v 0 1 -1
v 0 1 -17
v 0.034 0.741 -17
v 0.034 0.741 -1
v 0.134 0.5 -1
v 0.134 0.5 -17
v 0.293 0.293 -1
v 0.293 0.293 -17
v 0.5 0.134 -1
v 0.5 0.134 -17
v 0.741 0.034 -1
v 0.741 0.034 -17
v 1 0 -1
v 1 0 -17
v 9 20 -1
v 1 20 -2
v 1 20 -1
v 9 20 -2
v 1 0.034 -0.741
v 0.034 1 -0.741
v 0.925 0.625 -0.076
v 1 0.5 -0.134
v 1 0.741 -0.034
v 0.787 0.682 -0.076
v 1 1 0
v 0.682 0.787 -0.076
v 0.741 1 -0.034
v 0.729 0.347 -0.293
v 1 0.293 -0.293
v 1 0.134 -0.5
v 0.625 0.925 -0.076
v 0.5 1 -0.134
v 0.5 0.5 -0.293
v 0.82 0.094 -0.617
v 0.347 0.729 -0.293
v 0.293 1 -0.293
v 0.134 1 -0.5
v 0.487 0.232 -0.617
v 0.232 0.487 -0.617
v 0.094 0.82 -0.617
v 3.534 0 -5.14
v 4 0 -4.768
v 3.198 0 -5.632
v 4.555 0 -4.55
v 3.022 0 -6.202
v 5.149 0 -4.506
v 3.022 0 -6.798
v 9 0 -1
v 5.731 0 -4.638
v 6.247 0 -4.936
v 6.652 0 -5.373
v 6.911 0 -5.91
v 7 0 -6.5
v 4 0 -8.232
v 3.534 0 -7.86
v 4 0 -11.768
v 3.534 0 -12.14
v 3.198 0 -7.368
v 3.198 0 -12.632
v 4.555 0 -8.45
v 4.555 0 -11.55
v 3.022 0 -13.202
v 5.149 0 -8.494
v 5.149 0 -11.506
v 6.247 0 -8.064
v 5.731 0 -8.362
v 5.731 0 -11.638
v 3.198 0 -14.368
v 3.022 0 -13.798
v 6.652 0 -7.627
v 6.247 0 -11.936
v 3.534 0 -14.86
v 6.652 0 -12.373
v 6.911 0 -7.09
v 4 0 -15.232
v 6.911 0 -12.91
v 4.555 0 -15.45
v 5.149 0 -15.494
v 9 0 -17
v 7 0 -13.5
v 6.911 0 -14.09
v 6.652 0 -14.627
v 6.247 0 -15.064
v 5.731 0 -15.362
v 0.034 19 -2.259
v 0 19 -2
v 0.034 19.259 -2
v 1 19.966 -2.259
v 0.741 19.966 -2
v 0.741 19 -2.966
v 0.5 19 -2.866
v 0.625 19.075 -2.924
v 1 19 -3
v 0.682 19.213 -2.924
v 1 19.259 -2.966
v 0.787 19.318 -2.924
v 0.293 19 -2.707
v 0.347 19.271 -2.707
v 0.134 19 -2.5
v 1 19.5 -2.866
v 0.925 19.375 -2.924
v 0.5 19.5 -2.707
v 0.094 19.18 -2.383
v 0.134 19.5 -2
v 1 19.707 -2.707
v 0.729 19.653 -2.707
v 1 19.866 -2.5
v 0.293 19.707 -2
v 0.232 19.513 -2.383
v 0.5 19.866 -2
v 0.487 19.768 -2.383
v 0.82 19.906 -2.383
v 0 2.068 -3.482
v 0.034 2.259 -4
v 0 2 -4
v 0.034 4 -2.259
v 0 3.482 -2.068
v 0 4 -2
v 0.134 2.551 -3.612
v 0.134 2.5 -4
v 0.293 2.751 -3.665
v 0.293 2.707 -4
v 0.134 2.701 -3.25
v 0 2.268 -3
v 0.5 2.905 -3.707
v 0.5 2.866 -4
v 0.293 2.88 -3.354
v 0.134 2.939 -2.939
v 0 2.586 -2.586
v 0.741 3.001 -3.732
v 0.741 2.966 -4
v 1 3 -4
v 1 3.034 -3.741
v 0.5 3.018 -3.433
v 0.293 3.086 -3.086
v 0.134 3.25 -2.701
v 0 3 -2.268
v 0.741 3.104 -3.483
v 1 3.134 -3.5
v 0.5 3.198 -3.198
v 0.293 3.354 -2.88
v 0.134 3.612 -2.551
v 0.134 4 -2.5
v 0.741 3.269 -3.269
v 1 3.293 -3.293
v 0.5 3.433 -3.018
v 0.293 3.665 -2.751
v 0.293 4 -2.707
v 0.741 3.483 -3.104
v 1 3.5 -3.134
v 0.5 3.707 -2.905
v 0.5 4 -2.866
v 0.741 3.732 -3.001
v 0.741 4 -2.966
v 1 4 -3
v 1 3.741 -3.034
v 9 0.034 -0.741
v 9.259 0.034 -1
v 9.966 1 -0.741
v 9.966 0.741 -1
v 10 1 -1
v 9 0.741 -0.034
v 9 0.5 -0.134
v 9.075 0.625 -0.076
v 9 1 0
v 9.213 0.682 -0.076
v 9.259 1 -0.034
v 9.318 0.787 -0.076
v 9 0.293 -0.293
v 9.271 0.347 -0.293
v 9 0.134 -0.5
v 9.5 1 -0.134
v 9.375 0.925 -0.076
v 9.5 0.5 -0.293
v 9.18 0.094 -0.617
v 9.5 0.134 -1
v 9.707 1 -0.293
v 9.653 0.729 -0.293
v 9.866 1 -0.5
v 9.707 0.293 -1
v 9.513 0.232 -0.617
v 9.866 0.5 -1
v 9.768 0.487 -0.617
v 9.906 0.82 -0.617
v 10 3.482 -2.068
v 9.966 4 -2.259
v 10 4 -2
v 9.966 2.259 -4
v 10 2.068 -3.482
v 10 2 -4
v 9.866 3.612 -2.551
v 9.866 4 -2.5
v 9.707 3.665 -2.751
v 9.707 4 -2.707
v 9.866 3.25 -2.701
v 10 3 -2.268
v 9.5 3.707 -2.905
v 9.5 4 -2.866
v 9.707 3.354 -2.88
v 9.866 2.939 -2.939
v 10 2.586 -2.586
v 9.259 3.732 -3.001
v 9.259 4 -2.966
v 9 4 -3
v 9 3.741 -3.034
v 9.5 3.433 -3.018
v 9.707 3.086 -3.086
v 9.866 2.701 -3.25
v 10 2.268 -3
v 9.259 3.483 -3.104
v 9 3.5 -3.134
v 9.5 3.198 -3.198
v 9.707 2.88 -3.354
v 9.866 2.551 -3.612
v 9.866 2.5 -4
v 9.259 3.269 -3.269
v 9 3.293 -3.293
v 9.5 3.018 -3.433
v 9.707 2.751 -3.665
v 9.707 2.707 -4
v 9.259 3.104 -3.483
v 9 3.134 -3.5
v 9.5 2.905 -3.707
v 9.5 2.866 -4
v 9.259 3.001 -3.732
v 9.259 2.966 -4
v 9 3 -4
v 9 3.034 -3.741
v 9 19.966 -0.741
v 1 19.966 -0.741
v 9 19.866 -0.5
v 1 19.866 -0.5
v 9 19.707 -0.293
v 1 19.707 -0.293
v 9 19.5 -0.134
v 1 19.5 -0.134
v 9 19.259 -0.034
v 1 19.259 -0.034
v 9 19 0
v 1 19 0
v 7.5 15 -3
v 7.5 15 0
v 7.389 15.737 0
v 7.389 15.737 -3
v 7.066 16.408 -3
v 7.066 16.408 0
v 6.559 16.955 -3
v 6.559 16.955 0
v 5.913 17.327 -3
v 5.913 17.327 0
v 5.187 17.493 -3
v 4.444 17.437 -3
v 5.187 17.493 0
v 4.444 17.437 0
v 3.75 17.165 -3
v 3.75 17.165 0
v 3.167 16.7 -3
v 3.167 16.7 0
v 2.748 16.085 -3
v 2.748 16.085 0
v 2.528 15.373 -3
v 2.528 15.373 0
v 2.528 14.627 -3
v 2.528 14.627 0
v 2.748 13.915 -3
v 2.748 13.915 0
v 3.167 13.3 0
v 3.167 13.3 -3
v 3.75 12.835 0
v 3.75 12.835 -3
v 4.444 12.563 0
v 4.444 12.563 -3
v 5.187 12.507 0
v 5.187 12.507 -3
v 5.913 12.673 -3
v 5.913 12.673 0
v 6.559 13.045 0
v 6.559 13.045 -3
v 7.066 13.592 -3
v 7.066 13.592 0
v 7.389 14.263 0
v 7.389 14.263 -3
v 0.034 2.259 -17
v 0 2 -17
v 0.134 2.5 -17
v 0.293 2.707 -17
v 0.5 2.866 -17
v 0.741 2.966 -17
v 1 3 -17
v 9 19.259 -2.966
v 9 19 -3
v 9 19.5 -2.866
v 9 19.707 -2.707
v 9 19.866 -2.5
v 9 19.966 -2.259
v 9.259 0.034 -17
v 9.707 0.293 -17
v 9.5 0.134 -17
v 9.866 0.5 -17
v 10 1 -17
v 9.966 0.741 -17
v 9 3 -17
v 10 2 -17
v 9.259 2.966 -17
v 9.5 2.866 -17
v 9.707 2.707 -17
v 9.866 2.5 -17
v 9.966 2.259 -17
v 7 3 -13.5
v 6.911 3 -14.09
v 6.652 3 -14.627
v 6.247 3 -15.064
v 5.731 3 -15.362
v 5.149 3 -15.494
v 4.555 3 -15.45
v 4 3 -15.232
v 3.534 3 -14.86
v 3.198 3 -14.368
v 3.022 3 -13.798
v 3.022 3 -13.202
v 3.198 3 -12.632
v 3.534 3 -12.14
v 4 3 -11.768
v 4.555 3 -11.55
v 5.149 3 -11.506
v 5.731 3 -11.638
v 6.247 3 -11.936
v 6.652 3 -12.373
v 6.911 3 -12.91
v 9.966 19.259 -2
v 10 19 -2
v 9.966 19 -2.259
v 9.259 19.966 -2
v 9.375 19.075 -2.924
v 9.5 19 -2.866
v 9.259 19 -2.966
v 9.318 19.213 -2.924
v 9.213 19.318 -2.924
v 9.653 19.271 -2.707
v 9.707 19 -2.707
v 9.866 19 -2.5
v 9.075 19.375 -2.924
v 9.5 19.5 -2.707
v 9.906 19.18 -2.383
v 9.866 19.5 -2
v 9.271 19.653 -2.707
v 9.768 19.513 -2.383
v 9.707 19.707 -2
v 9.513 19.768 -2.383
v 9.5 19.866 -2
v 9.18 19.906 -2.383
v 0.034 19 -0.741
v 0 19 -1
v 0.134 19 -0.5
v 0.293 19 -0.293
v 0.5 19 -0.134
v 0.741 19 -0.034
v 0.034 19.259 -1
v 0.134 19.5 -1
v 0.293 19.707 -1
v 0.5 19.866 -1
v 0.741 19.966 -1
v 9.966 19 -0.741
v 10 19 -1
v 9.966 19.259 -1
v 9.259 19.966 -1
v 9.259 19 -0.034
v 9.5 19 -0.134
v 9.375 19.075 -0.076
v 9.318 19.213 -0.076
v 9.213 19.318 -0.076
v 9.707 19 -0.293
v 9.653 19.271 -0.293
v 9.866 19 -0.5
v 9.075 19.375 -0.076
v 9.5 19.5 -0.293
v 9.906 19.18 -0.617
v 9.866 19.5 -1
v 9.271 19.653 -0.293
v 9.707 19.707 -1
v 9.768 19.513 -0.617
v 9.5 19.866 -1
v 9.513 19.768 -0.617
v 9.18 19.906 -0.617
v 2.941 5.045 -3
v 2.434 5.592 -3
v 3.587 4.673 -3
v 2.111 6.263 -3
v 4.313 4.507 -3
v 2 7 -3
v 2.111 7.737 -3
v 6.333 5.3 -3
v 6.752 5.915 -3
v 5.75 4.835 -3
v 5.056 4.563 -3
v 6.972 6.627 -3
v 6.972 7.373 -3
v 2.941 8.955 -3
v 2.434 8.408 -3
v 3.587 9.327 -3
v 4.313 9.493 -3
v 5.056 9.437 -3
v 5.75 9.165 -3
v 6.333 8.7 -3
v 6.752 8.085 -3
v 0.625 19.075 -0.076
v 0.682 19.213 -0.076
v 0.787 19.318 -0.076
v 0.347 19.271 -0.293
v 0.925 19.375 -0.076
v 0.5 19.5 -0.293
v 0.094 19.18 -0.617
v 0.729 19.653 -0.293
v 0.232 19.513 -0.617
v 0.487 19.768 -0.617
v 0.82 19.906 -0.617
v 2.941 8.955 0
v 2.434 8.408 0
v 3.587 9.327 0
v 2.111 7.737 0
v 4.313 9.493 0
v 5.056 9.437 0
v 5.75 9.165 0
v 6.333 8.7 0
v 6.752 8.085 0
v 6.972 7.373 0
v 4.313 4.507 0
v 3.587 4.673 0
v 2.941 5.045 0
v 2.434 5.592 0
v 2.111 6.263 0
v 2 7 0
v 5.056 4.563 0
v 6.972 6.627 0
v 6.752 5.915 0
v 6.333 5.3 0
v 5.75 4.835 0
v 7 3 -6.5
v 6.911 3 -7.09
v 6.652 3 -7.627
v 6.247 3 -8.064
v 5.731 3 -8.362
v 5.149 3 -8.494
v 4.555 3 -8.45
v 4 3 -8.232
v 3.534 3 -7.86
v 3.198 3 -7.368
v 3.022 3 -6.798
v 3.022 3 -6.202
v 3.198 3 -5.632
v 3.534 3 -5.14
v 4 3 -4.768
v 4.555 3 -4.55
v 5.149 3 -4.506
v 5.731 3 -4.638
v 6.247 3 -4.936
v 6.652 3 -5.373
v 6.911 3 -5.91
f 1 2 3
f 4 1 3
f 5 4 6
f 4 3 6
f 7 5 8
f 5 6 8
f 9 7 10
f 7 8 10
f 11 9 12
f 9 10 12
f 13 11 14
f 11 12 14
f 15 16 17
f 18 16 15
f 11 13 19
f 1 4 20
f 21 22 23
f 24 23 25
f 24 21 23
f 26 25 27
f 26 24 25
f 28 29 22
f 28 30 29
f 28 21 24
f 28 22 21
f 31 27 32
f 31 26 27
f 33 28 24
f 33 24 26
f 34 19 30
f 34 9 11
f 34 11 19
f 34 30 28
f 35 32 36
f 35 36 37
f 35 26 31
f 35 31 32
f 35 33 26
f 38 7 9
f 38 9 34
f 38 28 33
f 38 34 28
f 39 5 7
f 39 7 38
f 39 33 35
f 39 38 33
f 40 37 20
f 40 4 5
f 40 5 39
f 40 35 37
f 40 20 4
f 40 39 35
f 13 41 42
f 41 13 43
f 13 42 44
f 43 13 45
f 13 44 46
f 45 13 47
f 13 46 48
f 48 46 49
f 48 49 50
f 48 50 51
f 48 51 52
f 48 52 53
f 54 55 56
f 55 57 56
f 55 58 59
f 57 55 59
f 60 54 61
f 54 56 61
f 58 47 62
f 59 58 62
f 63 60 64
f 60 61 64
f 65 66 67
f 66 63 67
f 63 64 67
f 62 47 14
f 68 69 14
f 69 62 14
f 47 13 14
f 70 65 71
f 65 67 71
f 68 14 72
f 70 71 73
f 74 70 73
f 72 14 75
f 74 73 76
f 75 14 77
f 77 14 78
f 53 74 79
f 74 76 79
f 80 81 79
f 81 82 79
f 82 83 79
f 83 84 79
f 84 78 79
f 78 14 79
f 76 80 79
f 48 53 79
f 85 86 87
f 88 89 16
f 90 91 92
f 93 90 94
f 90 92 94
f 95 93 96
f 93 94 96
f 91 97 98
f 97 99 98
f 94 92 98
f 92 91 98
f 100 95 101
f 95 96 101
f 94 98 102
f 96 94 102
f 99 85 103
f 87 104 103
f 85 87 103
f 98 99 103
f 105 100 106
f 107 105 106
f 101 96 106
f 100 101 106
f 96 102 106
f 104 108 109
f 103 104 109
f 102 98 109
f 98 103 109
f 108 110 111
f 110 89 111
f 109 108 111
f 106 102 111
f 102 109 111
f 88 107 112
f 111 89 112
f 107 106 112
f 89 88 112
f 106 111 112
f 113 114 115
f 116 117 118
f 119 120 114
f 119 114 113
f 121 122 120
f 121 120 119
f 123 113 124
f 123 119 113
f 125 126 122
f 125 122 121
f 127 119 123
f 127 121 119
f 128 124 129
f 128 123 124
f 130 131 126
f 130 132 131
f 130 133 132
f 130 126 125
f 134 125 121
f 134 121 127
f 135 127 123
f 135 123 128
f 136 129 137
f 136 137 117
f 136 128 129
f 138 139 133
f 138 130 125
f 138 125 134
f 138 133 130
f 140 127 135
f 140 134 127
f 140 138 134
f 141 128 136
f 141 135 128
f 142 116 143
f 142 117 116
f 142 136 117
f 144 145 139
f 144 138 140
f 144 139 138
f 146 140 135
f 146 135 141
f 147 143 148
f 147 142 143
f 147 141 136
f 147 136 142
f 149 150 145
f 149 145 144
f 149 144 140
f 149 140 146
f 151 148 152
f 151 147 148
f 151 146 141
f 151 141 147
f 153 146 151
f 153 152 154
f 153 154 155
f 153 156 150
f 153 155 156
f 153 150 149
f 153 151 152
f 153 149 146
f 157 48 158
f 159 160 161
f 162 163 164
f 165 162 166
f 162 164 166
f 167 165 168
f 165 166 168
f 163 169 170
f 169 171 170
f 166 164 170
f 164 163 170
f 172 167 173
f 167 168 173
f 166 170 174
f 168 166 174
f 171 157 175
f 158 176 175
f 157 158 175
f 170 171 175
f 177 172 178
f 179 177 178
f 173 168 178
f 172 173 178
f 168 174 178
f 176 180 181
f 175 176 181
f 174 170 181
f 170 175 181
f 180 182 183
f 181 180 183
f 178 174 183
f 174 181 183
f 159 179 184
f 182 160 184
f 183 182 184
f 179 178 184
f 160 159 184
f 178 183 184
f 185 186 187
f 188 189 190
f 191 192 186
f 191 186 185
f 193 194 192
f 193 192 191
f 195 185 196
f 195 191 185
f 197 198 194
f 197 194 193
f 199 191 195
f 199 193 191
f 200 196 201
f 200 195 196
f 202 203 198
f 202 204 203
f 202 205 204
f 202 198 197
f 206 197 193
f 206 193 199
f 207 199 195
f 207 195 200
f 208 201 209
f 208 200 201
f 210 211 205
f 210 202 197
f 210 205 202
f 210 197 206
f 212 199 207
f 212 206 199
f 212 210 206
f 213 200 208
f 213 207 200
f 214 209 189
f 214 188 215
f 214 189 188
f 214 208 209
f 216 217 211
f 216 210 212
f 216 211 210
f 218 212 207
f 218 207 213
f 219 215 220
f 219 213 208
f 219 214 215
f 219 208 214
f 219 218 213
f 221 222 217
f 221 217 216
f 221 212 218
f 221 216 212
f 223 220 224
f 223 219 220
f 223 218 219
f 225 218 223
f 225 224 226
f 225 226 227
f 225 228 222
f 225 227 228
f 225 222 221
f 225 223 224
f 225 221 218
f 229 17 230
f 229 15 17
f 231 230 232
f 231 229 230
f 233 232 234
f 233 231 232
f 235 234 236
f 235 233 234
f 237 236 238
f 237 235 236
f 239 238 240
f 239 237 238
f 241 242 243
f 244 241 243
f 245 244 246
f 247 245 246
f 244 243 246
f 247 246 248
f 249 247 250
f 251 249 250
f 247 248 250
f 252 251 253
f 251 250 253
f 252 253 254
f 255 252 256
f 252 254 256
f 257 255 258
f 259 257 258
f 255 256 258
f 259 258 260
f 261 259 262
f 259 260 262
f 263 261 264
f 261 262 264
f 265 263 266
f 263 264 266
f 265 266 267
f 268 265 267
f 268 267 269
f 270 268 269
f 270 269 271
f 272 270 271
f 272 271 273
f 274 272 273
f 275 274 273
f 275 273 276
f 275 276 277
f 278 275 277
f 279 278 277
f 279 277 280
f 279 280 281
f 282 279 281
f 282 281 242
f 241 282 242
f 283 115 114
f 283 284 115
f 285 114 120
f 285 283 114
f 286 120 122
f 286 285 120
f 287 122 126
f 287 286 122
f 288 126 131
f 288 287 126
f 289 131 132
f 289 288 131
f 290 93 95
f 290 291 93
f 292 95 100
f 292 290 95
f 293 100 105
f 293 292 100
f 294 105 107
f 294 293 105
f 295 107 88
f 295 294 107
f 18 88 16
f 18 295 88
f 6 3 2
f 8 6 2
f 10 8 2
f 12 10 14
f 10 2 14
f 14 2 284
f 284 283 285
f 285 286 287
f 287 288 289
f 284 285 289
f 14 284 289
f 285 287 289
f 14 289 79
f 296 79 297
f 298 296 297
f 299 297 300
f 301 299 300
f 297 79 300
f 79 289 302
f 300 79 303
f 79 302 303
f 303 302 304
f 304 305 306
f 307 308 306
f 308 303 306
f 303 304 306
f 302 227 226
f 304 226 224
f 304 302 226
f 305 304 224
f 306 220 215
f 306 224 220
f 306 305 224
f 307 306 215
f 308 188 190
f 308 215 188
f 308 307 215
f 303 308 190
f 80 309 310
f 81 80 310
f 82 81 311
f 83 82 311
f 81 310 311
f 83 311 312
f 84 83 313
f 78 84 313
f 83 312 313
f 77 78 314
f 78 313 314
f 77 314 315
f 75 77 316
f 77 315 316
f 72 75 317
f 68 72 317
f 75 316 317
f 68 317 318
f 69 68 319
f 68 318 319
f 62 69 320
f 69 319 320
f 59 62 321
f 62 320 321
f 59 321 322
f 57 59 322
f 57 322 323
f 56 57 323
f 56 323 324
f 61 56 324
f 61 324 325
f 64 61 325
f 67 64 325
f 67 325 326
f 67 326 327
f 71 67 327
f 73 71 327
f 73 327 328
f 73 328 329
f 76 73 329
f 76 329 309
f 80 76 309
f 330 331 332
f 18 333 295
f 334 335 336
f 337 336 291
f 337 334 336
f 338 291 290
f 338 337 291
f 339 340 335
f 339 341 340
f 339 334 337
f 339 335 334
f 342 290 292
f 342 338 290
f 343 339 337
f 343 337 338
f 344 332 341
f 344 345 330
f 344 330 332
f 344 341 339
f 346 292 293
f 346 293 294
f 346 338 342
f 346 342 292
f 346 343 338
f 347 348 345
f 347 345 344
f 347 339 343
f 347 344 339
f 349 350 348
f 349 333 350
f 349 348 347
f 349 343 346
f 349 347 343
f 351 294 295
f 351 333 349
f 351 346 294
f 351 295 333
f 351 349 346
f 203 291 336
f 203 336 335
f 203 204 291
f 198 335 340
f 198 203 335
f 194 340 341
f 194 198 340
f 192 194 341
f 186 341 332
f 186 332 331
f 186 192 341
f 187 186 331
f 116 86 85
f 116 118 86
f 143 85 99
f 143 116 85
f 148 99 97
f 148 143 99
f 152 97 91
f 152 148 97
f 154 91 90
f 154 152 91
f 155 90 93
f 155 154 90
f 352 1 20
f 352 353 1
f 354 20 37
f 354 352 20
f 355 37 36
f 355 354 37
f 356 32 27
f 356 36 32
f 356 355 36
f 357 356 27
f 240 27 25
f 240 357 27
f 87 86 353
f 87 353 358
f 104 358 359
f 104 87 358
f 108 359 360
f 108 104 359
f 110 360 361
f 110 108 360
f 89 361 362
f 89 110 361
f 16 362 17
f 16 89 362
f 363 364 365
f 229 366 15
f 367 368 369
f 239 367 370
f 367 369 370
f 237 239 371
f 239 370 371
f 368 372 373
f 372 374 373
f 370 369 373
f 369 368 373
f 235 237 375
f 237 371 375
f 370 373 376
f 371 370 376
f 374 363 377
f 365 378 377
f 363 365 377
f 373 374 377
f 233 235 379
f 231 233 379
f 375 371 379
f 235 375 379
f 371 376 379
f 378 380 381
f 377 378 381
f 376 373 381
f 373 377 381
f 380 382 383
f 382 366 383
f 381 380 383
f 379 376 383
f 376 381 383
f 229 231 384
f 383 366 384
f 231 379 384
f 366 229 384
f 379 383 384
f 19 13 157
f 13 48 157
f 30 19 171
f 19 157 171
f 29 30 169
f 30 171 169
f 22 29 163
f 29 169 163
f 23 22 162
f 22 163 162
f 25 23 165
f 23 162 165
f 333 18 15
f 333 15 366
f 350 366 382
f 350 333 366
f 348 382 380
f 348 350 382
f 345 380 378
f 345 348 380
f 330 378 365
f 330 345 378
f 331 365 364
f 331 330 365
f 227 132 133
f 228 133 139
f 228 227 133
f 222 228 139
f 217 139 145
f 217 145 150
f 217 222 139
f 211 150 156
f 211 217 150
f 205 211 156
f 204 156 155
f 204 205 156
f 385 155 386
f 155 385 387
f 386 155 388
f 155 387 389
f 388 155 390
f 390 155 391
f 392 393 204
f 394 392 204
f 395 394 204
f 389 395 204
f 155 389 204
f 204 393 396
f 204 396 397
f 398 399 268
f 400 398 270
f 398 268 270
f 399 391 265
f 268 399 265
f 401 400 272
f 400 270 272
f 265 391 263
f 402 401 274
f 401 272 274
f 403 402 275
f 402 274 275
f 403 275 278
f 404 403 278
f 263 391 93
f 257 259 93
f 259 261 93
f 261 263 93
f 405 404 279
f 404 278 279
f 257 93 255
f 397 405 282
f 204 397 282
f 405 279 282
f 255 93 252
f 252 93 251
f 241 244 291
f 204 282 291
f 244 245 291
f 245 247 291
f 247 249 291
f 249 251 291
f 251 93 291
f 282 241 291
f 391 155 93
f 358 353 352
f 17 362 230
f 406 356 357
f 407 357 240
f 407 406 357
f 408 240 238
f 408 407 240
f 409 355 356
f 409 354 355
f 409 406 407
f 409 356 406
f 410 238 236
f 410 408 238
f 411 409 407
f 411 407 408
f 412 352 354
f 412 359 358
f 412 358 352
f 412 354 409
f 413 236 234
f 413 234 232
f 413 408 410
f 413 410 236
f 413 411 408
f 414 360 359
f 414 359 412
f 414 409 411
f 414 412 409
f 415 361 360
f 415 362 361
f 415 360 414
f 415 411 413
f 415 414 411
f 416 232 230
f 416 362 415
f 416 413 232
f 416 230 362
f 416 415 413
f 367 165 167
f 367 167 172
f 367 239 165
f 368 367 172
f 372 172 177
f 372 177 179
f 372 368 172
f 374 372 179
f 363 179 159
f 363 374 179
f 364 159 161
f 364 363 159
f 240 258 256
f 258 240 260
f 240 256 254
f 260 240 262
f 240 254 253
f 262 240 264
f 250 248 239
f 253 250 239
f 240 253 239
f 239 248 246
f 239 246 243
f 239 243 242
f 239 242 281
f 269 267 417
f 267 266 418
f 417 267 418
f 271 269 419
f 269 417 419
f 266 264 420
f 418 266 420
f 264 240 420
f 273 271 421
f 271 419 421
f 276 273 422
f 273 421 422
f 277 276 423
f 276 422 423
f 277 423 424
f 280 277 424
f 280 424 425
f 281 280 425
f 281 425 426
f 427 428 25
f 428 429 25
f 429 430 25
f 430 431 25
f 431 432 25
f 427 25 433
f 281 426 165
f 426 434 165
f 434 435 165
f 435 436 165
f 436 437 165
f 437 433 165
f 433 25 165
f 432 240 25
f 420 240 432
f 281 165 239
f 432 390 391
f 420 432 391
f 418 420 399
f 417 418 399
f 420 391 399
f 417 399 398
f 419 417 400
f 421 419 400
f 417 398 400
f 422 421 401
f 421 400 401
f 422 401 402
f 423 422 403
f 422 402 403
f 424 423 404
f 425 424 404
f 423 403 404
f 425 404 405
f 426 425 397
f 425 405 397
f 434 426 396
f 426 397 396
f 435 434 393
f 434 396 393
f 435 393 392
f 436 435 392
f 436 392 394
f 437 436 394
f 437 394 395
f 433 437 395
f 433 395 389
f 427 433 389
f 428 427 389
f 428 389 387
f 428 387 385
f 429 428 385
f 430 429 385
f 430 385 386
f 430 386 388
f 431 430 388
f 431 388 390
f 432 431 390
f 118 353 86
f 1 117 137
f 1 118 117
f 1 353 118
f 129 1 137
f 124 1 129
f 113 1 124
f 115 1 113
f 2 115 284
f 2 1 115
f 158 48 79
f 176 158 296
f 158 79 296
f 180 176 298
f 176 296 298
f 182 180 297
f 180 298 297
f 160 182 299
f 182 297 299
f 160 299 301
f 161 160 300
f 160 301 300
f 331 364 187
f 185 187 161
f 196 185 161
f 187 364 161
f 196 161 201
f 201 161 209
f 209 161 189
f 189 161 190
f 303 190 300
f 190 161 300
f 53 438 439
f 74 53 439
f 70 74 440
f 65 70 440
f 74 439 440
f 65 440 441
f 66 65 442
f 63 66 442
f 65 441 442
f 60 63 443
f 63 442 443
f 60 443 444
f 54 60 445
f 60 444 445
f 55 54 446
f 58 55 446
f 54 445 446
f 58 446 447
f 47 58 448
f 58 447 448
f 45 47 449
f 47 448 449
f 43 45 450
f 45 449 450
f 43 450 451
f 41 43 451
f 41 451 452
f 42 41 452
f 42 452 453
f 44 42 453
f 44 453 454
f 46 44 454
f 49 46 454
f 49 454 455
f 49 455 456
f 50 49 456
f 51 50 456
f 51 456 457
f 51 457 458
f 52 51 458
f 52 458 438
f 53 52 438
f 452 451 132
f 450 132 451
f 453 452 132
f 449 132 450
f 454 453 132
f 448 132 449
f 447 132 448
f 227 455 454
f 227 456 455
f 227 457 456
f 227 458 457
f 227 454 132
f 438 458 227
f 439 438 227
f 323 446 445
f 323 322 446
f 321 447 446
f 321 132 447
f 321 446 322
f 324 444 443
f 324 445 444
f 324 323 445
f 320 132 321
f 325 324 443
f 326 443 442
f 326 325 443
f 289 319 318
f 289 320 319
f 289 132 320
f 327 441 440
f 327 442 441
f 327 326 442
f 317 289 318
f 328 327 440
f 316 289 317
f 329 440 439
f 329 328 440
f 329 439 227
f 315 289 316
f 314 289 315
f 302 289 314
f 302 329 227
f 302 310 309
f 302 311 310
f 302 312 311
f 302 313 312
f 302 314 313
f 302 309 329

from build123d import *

# Parameters (mm, degrees)
SKETCH1_W           = 10
SKETCH1_H           = 20
BOSS_EXTRUDE1_DEPTH = 20
SKETCH2_W           = 10
SKETCH2_H           = 17
CUT_EXTRUDE1_DEPTH  = 17
SKETCH3_R           = 2.5
CUT_EXTRUDE2_DEPTH  = 21
SKETCH4_W           = 10
SKETCH4_H           = 3
CUT_EXTRUDE3_DEPTH  = 4
SKETCH5_R           = 2
CUT_EXTRUDE4_DEPTH  = 4
FILLET1_R           = 1
SKETCH6_R           = 2.5
CUT_EXTRUDE5_DEPTH  = 4


with BuildPart() as part:
    # Sketch1 → Boss-Extrude1 (new body)
    with BuildSketch(Plane(origin=(0, 0, 0), x_dir=(1, 0, 0), z_dir=(0, 1, 0))):
        with Locations((5, 10)):
            Rectangle(SKETCH1_W, SKETCH1_H)
    extrude(amount=BOSS_EXTRUDE1_DEPTH)

    # Sketch2 → Cut-Extrude1 (cut)
    with BuildSketch(Plane(origin=(0, 20, 0), x_dir=(1, 0, 0), z_dir=(0, 1, 0))):
        with Locations((5, 11.5)):
            Rectangle(SKETCH2_W, SKETCH2_H)
    extrude(amount=-CUT_EXTRUDE1_DEPTH, mode=Mode.SUBTRACT)

    # Sketch3 → Cut-Extrude2 (cut, through all)
    with BuildSketch(Plane.XY):
        with Locations((5, 15)):
            Circle(SKETCH3_R)
    extrude(amount=-CUT_EXTRUDE2_DEPTH, mode=Mode.SUBTRACT)

    # Sketch4 → Cut-Extrude3 (cut, through all)
    with BuildSketch(Plane(origin=(0, 3, 0), x_dir=(1, 0, 0), z_dir=(0, 1, 0))):
        with Locations((5, 18.5)):
            Rectangle(SKETCH4_W, SKETCH4_H)
    extrude(amount=-CUT_EXTRUDE3_DEPTH, mode=Mode.SUBTRACT)

    # Sketch5 → Cut-Extrude4 (cut, through all)
    with BuildSketch(Plane(origin=(0, 3, 0), x_dir=(1, 0, 0), z_dir=(0, 1, 0))):
        with Locations((5, 6.5)):
            Circle(SKETCH5_R)
        with Locations((5, 13.5)):
            Circle(SKETCH5_R)
    extrude(amount=-CUT_EXTRUDE4_DEPTH, mode=Mode.SUBTRACT)

    # Fillet1
    fillet1_edges = [part.edges().sort_by_distance(p)[0] for p in [
        (10, 20, -1.5),
        (0, 20, -1.5),
        (0, 11.5, -3),
        (10, 3, -10),
        (5, 3, -3),
        (10, 11.5, -3),
        (5, 20, -3),
        (0, 3, -10),
        (0, 0, -8.5),
        (10, 0, -8.5),
        (5, 0, 0),
        (10, 10, 0),
        (0, 10, 0),
        (5, 20, 0),
    ]]
    fillet(fillet1_edges, radius=FILLET1_R)

    # Sketch6 → Cut-Extrude5 (cut, through all)
    with BuildSketch(Plane(origin=(0, 0, -3), x_dir=(-1, 0, 0), z_dir=(0, 0, -1))):
        with Locations((-4.5, 7)):
            Circle(SKETCH6_R)
    extrude(amount=-CUT_EXTRUDE5_DEPTH, mode=Mode.SUBTRACT)


solid = part.part
